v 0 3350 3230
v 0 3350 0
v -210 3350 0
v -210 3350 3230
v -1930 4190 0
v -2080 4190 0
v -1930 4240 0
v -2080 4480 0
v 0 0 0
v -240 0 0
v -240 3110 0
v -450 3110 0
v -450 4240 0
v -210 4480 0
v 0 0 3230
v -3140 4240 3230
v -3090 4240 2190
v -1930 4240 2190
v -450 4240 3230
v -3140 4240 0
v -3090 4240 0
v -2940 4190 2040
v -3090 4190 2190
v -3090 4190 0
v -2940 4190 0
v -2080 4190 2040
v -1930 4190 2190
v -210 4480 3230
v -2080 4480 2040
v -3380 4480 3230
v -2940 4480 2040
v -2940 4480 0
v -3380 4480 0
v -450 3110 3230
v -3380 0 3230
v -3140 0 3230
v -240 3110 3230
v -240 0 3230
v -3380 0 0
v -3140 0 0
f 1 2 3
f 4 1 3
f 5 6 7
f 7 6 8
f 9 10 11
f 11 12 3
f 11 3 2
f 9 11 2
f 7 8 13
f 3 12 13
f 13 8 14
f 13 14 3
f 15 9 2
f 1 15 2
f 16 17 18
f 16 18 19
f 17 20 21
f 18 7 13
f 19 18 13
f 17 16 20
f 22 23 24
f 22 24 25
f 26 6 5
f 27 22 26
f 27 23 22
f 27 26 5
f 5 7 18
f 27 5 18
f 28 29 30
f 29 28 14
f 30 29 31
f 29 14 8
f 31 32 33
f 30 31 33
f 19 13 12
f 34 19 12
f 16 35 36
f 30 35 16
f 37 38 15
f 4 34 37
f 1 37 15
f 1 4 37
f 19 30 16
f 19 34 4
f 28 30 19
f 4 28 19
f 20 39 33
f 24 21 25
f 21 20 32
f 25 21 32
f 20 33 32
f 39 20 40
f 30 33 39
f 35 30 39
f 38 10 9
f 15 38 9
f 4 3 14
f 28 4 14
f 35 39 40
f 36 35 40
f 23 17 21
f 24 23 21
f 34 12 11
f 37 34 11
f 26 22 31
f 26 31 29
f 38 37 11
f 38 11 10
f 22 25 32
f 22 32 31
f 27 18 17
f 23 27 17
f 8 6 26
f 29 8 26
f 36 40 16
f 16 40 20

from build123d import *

# Parameters (mm, degrees)
F1_DEPTH = 3230
F3_DEPTH = 50
F4_W     = 860
F4_H     = 2040
F5_DEPTH = 300


with BuildPart() as f1:
    # F0 (on Top) → F1 (new body)
    with BuildSketch(Plane.XY):
        Polygon((-3140, 240), (-3140, 4240), (-450, 4240), (-450, 3110), (-240, 3110), (-240, 240), (-240, 0), (0, 0), (0, 3350), (-210, 3350), (-210, 4480), (-3380, 4480), (-3380, 0), (-3140, 0), align=None)
    extrude(amount=F1_DEPTH)

    # F2 (on face) → F3 (join)
    with BuildSketch(Plane.XZ.offset(-4240)):
        Polygon((-1930, 2190), (-3090, 2190), (-3090, 0), (-2940, 0), (-2940, 2040), (-2080, 2040), (-2080, 0), (-1930, 0), align=None)
    extrude(amount=F3_DEPTH)

    # F4 (on face) → F5 (cut)
    with BuildSketch(Plane.XZ.offset(-4240)):
        with Locations((-2510, 1020)):
            Rectangle(F4_W, F4_H)
    extrude(amount=-F5_DEPTH, mode=Mode.SUBTRACT)


solid = f1.part
